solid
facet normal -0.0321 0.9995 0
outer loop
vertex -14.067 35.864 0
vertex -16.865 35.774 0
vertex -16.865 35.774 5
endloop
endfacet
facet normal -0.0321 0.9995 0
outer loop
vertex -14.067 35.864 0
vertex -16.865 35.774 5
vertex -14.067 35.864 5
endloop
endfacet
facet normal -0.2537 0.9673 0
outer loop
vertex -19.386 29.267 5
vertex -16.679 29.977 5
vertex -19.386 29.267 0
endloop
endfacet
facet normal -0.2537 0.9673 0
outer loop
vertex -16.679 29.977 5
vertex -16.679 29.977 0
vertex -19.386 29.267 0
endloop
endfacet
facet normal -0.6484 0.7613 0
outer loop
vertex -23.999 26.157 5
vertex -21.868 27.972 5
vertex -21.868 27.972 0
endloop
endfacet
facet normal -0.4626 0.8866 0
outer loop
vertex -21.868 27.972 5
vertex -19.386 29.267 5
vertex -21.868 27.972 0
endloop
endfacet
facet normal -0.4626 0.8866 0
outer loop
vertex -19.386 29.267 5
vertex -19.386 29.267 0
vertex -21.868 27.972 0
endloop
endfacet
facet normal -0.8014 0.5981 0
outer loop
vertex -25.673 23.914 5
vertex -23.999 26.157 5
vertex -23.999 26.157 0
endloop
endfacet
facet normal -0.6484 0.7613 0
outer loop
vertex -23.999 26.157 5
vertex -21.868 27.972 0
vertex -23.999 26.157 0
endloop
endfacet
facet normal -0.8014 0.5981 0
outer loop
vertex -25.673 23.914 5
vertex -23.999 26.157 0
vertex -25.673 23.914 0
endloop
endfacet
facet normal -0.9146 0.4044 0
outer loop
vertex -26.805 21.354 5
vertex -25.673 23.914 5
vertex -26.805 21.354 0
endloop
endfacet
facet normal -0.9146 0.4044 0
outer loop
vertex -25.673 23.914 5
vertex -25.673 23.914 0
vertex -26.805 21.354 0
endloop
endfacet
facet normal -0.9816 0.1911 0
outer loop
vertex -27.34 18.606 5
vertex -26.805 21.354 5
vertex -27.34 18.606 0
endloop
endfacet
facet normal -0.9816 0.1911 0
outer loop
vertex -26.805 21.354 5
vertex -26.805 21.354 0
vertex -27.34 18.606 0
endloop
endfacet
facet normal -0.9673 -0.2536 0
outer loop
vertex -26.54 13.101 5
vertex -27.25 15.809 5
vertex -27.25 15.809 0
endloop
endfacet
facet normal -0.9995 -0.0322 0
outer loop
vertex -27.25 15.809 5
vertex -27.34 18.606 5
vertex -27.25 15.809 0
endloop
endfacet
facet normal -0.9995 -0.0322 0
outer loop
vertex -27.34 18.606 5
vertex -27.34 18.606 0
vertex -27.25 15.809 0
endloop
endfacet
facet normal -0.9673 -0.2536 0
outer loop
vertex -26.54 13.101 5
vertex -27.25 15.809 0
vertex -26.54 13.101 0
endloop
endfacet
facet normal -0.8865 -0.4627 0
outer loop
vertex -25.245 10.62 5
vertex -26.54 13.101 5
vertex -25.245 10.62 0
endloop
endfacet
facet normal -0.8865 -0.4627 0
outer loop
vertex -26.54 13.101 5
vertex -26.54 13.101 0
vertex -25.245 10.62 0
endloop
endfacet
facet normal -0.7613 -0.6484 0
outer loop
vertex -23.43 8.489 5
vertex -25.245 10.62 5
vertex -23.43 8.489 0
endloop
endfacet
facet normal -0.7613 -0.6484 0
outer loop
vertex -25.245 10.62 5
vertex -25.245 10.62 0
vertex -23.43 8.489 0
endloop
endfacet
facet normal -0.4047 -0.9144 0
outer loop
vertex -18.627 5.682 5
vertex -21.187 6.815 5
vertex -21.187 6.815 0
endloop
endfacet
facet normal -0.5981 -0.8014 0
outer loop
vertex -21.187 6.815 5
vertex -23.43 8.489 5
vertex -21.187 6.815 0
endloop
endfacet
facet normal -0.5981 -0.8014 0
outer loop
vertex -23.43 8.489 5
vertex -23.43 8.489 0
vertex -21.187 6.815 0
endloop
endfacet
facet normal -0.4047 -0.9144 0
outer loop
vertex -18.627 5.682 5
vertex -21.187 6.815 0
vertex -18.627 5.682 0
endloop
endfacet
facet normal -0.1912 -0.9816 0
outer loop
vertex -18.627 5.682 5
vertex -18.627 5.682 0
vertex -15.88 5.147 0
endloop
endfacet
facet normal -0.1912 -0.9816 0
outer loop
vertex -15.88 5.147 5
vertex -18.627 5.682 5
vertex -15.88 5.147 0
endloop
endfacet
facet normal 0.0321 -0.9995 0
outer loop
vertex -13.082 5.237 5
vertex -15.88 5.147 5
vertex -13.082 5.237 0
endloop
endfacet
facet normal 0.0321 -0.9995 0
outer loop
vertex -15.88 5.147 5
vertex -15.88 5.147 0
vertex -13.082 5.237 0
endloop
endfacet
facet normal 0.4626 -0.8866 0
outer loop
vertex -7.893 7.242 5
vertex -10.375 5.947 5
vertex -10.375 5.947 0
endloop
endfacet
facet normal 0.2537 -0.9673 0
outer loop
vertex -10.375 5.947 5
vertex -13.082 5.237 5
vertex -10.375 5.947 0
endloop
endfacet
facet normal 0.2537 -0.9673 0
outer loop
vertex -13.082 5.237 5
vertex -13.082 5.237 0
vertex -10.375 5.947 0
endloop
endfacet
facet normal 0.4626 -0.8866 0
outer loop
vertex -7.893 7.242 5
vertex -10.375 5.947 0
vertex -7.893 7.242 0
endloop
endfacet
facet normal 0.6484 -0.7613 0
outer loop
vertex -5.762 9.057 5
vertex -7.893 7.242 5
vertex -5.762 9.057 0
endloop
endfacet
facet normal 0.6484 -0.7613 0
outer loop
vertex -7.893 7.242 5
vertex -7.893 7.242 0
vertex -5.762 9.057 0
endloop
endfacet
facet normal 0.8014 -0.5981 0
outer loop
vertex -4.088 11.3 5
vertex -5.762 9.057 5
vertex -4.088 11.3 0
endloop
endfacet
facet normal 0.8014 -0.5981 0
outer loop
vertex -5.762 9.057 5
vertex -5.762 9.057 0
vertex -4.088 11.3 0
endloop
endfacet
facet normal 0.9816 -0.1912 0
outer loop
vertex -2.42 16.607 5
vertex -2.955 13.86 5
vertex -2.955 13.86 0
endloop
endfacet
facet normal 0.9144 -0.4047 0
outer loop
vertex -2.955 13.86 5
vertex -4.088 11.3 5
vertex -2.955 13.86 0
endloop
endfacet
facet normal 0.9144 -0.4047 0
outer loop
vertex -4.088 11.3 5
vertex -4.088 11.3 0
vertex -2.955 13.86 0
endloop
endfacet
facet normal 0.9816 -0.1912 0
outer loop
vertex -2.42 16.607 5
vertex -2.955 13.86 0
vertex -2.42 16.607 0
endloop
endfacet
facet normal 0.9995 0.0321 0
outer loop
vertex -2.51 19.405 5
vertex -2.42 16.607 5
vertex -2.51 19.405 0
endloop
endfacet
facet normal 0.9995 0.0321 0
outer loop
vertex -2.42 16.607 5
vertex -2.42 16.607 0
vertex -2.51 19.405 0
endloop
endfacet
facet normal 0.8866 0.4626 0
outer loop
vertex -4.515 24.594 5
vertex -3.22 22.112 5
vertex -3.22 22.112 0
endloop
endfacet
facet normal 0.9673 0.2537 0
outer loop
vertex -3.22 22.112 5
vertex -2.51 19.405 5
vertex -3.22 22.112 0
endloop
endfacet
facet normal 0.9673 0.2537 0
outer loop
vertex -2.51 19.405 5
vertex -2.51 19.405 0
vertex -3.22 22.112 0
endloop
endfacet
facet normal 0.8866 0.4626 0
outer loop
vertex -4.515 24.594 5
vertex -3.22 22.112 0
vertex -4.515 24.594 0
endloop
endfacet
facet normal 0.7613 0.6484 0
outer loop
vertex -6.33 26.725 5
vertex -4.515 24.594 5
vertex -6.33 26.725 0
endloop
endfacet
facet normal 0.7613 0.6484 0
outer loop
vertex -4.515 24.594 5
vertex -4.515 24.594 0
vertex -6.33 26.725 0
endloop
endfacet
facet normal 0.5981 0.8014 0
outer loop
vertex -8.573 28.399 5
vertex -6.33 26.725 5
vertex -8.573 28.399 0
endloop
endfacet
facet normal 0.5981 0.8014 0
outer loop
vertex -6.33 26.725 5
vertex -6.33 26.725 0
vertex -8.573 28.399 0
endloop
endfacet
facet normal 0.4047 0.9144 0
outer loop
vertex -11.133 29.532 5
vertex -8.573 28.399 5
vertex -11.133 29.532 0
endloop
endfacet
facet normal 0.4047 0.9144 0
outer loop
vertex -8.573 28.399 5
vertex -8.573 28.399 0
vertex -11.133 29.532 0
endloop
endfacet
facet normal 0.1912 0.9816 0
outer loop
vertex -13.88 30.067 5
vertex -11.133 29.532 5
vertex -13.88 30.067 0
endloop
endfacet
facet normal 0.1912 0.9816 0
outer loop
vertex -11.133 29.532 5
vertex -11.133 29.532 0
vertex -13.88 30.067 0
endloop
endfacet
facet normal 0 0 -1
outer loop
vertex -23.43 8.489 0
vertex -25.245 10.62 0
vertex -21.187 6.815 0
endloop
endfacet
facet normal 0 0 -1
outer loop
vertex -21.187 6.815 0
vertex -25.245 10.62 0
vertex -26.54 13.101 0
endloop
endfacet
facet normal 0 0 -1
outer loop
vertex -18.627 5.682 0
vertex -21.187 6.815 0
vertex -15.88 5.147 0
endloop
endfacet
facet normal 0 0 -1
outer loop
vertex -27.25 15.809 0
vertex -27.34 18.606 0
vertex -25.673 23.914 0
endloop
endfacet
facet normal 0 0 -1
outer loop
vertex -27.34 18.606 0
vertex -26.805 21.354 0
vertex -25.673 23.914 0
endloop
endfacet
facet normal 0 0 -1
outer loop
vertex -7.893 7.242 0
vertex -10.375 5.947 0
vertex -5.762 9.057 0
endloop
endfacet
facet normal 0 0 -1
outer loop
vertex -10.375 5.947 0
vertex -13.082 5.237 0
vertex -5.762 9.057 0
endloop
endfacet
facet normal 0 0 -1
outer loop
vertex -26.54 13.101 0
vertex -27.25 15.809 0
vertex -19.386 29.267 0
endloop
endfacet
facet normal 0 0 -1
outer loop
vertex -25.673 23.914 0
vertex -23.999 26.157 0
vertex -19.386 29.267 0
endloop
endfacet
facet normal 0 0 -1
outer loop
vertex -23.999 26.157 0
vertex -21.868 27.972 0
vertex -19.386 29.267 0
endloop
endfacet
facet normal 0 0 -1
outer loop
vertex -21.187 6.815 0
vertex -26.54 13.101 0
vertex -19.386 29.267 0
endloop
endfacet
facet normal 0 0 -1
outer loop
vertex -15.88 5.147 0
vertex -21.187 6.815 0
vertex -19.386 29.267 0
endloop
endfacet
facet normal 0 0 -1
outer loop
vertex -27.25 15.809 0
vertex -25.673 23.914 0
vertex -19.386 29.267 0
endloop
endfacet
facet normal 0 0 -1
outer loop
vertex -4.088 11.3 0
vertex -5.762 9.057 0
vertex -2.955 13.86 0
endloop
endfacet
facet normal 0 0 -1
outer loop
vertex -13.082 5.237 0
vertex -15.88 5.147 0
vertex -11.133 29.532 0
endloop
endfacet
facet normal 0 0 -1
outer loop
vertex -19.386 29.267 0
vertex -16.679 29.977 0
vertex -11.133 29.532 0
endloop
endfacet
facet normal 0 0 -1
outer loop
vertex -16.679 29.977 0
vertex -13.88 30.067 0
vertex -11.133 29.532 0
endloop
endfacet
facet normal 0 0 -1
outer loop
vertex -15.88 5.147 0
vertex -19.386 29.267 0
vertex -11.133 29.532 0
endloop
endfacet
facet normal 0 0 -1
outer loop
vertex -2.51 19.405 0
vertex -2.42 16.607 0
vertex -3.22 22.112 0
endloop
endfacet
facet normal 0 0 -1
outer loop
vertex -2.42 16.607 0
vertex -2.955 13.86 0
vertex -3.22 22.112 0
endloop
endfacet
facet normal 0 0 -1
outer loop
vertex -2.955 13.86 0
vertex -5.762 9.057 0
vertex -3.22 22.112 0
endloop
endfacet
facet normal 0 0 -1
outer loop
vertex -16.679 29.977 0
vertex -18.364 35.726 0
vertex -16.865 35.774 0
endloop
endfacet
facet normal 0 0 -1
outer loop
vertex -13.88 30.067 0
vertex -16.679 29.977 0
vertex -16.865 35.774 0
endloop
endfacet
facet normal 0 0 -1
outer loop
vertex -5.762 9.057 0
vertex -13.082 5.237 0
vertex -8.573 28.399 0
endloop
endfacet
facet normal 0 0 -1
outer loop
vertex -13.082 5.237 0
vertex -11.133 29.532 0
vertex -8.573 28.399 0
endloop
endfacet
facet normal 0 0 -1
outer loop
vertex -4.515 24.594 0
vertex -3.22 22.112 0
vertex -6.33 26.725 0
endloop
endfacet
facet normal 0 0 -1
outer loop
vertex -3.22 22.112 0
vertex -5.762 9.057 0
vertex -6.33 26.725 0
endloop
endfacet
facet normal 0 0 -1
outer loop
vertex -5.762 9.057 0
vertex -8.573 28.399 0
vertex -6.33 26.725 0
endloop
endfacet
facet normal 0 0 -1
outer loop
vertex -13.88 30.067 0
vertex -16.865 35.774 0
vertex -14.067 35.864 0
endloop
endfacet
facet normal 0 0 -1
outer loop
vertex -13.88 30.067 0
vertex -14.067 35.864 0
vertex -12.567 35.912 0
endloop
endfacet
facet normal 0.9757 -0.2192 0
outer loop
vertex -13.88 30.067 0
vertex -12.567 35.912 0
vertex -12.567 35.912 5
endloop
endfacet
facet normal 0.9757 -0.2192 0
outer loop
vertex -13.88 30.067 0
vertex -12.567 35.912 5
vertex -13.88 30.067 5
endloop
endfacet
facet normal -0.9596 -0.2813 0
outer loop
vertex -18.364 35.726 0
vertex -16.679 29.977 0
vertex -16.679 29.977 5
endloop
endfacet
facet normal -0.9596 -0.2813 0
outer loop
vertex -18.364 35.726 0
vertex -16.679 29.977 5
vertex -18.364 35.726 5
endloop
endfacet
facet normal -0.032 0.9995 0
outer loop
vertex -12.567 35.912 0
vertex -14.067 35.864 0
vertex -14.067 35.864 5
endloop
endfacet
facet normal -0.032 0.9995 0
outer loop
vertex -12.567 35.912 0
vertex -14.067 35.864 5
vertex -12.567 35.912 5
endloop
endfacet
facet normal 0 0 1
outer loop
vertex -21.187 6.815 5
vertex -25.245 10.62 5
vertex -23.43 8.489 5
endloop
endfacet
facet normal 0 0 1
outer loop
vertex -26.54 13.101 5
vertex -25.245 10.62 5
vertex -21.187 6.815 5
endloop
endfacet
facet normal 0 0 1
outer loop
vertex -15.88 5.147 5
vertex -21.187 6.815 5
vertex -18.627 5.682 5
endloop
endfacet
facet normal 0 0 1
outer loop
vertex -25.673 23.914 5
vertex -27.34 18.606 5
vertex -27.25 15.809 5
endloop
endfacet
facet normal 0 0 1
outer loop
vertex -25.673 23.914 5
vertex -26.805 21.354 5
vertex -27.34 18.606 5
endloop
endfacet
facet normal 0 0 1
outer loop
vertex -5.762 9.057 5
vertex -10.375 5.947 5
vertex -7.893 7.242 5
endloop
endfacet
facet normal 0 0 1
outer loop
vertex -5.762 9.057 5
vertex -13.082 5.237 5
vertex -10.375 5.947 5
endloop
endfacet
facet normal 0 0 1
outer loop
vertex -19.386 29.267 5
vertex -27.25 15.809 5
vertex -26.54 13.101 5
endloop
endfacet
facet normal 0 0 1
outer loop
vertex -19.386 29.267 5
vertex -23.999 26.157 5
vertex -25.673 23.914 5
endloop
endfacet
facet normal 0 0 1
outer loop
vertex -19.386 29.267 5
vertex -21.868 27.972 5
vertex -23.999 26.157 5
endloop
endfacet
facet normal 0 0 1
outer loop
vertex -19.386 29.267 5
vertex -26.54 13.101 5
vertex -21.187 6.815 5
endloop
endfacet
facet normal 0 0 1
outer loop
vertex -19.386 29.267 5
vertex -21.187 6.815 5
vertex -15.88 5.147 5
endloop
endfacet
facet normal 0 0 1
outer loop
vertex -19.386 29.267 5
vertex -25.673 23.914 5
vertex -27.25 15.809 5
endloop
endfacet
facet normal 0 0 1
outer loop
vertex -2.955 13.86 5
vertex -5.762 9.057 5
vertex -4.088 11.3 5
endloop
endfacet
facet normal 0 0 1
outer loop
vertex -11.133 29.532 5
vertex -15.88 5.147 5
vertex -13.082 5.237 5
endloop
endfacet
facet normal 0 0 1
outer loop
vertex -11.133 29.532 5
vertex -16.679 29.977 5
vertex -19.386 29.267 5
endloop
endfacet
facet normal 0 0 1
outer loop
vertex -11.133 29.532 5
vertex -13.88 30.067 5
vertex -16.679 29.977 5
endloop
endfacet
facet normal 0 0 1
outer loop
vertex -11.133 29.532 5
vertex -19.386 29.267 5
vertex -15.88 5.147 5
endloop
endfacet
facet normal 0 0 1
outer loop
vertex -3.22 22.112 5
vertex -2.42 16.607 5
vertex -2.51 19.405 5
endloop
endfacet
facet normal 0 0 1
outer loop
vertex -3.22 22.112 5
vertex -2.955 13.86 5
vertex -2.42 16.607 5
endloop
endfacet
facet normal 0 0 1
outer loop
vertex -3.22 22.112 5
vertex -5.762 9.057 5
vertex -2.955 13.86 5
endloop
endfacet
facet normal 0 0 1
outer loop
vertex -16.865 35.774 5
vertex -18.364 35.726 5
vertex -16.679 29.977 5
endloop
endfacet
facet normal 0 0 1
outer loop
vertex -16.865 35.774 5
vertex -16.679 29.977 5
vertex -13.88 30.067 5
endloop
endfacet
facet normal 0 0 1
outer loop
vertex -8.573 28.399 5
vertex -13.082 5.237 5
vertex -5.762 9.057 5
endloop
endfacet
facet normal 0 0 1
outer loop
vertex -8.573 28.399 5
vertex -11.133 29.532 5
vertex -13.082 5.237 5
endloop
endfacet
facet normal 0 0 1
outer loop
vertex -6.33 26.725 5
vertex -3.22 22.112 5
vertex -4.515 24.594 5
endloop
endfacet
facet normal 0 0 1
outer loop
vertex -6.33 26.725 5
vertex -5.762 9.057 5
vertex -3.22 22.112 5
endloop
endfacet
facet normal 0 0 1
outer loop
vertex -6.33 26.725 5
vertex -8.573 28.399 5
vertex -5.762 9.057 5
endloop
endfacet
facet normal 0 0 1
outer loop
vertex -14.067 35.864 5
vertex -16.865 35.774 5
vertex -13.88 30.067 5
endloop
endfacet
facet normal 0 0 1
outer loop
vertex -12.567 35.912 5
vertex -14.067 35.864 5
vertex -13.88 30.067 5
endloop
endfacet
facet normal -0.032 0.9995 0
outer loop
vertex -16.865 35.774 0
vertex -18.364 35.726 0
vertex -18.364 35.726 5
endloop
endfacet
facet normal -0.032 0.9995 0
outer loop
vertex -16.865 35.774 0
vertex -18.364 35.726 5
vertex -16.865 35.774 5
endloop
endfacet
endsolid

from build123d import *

# Parameters (mm, degrees)
SKETCH_1_R      = 12.5
EXTRUDE_1_DEPTH = 5
EXTRUDE_2_DEPTH = 5


with BuildPart() as part:
    # ｽｹｯﾁ1 → ﾎﾞｽ - 押し出し1 (new body)
    with BuildSketch(Plane.XY):
        with Locations((-14.880131723, 17.607142857)):
            Circle(SKETCH_1_R)
    extrude(amount=EXTRUDE_1_DEPTH)

    # ｽｹｯﾁ2 → ﾎﾞｽ - 押し出し2 (add)
    with BuildSketch(Plane(origin=(0, 0, 0), x_dir=(-1, 0, 0), z_dir=(0, 0, -1))):
        Polygon((13.880131723, 30.067078652), (16.678684785, 29.977074421), (18.364346975, 35.725860639), (16.86512212, 35.774077191), (14.066569059, 35.864081422), (12.567344204, 35.912297974), align=None)
    extrude(amount=-EXTRUDE_2_DEPTH)


solid = part.part
